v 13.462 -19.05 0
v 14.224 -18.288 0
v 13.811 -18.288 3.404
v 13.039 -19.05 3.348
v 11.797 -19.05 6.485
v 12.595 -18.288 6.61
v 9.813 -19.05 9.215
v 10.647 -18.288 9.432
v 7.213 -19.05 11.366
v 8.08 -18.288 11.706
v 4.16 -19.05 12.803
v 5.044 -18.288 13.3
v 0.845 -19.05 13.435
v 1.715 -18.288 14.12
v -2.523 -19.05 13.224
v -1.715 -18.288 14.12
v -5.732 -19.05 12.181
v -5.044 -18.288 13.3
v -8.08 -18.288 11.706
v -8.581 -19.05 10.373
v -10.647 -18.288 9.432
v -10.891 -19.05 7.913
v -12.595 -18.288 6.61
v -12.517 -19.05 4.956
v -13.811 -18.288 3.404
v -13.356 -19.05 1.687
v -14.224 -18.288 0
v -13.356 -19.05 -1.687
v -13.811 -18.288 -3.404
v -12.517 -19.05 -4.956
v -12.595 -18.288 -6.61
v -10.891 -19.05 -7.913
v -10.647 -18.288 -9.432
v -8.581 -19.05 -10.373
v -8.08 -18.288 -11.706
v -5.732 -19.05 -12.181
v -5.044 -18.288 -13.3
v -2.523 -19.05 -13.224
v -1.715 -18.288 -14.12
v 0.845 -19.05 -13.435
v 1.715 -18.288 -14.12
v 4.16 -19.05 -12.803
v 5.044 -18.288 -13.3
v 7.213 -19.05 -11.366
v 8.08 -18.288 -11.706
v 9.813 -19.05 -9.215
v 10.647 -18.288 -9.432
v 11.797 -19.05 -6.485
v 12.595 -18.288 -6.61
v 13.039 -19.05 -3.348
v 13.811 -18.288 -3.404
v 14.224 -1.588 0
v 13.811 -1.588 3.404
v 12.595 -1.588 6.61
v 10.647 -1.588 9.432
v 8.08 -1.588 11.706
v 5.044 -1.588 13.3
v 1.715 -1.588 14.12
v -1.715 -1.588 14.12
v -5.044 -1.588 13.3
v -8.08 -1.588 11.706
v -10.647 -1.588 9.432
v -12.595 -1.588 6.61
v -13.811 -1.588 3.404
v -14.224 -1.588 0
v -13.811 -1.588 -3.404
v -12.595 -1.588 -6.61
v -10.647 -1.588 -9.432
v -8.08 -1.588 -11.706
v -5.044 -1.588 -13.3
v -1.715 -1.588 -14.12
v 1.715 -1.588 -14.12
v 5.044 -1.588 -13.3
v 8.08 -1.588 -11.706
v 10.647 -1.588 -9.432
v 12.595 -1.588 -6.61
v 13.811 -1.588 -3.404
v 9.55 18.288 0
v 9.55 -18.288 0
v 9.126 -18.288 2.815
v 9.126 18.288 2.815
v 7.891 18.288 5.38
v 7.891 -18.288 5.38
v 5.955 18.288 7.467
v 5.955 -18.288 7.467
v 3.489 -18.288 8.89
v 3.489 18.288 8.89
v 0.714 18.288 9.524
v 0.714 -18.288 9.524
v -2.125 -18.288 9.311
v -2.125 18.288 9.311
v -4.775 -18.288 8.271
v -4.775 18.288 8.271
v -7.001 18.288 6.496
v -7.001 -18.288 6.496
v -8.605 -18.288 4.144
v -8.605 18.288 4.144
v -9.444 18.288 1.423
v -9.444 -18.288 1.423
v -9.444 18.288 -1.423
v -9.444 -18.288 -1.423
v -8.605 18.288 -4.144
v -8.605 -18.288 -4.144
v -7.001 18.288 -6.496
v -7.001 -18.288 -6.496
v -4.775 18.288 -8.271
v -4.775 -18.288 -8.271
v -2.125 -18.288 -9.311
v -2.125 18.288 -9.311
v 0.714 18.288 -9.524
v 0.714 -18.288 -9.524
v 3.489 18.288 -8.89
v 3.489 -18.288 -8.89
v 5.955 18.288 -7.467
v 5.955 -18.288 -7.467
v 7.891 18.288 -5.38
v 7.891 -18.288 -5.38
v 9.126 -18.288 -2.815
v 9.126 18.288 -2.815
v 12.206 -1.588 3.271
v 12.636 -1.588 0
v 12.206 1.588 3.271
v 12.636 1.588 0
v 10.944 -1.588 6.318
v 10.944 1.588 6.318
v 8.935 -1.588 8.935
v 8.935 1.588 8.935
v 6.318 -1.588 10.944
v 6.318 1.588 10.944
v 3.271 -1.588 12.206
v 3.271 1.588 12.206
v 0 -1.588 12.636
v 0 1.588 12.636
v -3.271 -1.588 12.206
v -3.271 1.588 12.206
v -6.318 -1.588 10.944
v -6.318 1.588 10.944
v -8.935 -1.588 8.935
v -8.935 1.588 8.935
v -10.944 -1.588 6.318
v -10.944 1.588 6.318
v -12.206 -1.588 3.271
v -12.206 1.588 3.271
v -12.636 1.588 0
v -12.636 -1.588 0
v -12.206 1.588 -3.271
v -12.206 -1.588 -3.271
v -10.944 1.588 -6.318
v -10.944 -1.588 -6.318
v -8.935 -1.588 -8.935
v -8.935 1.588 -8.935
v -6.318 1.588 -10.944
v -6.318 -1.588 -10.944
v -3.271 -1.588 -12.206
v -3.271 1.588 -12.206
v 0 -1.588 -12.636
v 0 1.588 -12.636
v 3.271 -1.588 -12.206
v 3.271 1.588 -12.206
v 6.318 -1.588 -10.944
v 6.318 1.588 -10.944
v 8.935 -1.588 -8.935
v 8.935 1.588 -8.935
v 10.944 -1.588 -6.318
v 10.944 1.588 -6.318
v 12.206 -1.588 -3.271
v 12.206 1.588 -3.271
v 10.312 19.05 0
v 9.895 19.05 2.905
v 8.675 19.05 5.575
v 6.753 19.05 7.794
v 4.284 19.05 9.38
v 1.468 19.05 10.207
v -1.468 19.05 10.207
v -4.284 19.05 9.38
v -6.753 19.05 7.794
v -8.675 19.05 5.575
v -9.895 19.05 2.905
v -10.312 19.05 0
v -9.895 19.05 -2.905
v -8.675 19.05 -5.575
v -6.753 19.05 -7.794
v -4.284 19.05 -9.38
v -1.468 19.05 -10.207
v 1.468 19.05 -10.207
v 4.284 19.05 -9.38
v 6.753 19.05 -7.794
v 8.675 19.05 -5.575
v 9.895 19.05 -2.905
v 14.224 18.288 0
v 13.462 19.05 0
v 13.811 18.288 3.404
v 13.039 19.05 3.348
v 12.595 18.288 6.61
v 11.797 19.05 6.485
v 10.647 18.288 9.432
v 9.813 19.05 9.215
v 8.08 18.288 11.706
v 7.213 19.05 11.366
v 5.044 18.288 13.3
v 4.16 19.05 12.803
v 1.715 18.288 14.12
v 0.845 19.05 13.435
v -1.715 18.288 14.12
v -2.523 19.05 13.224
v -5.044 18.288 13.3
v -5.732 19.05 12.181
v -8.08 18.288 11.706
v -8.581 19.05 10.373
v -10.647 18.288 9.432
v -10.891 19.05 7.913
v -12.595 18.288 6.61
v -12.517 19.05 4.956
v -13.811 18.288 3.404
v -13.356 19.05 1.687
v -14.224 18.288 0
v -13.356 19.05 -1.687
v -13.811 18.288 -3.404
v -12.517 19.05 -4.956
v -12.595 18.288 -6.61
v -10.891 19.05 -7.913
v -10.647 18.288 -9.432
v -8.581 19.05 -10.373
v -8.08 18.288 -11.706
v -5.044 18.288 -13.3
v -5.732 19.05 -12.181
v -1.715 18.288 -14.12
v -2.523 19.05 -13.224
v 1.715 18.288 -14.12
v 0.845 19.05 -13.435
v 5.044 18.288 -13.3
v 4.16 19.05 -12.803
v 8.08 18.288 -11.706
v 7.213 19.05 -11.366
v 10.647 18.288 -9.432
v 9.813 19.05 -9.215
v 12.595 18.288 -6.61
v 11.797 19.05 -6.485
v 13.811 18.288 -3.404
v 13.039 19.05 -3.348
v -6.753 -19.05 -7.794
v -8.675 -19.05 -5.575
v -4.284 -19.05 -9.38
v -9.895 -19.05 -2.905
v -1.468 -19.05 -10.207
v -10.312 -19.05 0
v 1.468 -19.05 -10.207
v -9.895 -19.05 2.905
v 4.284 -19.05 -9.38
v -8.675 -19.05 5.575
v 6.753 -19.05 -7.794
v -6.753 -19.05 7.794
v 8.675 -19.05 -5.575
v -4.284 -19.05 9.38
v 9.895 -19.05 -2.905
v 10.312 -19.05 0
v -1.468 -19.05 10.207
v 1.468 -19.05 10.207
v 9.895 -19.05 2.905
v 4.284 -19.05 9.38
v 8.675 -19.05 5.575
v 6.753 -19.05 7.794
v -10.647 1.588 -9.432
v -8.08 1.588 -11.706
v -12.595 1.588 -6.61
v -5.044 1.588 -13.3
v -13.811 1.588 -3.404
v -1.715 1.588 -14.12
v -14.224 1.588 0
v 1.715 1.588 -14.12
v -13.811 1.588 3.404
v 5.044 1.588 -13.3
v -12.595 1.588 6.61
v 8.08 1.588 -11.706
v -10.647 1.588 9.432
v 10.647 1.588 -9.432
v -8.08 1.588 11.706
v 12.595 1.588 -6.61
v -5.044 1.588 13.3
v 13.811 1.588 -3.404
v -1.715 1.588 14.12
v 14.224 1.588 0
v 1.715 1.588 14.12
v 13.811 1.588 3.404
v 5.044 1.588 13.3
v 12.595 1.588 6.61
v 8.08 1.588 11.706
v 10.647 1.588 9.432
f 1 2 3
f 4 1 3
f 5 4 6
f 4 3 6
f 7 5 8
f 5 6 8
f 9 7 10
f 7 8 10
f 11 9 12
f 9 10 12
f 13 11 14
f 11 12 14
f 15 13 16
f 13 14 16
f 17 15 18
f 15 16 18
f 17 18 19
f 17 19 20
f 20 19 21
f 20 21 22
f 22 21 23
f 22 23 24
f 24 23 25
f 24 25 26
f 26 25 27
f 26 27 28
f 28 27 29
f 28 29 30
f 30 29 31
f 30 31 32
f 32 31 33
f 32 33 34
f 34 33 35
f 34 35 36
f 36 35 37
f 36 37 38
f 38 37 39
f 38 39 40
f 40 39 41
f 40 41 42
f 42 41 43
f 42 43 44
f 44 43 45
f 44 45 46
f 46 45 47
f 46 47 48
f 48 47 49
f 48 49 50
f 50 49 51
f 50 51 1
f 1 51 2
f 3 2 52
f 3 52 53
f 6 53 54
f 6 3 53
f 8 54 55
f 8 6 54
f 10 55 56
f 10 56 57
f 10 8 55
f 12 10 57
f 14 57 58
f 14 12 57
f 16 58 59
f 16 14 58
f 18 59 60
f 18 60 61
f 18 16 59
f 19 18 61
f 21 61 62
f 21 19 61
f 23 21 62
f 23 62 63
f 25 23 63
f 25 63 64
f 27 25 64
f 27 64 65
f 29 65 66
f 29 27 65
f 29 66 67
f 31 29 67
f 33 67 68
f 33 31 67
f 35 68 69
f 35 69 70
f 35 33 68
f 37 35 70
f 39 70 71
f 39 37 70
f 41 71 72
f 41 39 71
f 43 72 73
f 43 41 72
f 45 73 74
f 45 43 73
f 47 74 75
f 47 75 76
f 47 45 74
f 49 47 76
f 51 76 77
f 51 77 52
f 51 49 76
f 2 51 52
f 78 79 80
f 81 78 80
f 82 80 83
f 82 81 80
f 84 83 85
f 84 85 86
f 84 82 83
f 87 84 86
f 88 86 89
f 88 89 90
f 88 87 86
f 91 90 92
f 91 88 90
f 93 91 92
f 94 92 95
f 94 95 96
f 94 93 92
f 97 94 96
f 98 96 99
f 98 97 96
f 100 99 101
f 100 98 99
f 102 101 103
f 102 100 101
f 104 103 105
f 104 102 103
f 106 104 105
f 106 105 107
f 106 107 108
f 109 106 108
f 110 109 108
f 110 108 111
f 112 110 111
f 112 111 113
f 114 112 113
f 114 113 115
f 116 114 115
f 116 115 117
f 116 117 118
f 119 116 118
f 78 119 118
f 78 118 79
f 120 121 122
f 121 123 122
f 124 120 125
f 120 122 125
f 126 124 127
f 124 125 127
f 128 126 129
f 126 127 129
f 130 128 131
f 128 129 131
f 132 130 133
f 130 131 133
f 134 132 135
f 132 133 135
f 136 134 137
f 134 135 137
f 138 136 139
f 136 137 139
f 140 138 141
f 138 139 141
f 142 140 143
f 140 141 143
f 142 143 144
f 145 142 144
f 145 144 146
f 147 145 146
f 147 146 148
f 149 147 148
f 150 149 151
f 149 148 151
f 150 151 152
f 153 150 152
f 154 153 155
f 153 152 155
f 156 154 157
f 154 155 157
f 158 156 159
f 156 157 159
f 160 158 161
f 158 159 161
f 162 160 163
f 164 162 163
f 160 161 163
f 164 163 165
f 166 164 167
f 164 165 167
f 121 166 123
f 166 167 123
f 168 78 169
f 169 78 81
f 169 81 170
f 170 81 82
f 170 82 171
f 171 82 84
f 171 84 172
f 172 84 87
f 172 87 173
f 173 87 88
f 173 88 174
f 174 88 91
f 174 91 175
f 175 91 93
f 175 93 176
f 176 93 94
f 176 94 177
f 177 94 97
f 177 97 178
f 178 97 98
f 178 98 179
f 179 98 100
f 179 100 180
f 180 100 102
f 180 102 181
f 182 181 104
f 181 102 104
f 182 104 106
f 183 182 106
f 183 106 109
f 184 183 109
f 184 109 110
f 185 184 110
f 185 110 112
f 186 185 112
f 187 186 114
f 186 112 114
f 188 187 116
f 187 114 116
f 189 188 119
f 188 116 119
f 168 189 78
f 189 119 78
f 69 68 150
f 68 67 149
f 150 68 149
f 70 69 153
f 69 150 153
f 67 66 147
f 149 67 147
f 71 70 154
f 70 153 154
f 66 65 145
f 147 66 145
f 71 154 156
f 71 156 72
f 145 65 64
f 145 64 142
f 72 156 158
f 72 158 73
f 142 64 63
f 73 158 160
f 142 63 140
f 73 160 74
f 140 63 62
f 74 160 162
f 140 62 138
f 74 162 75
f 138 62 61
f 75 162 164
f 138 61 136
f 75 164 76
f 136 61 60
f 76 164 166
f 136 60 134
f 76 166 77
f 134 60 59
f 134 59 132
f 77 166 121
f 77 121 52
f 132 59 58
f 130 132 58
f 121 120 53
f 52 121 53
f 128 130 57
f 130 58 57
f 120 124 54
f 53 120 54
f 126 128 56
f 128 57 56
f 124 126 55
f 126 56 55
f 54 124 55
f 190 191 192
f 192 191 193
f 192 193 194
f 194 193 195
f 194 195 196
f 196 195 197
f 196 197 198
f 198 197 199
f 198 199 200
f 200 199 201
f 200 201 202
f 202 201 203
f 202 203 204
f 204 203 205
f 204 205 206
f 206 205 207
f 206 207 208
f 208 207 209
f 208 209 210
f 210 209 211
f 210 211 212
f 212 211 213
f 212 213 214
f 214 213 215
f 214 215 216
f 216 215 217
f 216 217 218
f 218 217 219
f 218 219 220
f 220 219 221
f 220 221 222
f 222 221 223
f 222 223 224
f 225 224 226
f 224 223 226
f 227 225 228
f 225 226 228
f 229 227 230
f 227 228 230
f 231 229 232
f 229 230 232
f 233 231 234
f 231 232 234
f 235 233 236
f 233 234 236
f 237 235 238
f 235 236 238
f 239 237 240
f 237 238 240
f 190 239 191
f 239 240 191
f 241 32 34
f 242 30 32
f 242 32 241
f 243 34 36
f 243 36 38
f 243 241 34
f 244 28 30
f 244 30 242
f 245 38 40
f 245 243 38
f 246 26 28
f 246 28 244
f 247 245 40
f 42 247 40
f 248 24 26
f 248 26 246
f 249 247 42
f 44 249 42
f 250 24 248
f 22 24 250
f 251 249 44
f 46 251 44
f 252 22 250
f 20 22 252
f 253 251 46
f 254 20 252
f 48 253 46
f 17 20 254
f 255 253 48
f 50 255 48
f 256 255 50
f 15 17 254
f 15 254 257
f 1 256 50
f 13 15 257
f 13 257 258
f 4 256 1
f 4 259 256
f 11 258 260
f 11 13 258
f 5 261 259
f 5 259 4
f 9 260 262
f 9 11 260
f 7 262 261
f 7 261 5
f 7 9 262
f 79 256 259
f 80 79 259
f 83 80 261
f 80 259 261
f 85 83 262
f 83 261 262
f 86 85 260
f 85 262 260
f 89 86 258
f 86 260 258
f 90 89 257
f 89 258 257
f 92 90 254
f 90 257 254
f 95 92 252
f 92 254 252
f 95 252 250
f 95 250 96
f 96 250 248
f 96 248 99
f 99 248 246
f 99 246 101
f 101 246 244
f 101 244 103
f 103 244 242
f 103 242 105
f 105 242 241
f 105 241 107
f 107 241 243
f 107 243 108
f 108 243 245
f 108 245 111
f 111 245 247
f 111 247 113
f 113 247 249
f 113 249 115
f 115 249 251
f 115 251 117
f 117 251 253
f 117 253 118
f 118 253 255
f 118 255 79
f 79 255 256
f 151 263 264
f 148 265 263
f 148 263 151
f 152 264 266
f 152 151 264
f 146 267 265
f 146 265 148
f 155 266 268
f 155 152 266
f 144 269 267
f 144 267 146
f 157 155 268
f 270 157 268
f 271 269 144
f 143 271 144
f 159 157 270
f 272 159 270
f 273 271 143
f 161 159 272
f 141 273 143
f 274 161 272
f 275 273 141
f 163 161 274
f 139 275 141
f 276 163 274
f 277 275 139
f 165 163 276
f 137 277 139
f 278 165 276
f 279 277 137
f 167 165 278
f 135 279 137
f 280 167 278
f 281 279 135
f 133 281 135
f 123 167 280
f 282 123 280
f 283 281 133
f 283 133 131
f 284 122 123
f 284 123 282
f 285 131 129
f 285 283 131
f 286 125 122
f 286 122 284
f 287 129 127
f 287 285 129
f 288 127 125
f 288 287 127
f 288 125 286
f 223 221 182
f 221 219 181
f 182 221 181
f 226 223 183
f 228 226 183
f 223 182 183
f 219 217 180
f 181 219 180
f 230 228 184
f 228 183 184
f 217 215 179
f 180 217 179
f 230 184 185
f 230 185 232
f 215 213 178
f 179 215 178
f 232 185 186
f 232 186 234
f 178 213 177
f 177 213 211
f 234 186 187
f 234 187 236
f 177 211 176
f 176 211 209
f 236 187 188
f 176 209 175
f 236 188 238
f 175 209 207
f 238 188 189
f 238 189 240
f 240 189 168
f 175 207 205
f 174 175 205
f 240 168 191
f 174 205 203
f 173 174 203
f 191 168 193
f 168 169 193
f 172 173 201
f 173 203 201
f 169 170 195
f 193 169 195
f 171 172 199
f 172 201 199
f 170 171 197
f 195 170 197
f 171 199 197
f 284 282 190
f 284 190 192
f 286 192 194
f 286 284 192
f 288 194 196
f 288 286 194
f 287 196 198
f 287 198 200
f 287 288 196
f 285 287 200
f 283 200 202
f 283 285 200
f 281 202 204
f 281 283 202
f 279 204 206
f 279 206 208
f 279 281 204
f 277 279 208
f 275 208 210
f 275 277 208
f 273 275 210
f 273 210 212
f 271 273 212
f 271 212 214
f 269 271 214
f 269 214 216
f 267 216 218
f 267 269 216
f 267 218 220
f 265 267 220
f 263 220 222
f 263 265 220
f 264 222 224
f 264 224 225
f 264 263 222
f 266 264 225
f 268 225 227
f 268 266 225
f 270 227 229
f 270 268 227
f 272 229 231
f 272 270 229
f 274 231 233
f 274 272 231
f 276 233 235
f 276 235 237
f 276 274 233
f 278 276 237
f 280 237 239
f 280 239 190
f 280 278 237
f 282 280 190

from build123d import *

# Parameters (mm, degrees)
F0_R     = 14.224
F0_R_2   = 9.5504
F1_DEPTH = 19.05
F2_R     = 14.224
F2_R_2   = 12.6365
F3_DEPTH = 1.5875
F4_SIZE  = 0.762


with BuildPart() as f1:
    # F0 (on Front) → F1 (new body, symmetric)
    with BuildSketch(Plane.XZ):
        Circle(F0_R)
        Circle(F0_R_2, mode=Mode.SUBTRACT)
    extrude(amount=F1_DEPTH, both=True)

    # F2 (on Front) → F3 (cut, symmetric)
    with BuildSketch(Plane.XZ):
        Circle(F2_R)
        Circle(F2_R_2, mode=Mode.SUBTRACT)
    extrude(amount=F3_DEPTH, both=True, mode=Mode.SUBTRACT)

    # F4
    f4_edges = [f1.edges().sort_by_distance(p)[0] for p in [
        (-14.224, 19.05, 0),
        (-14.224, -19.05, 0),
        (-9.5504, 19.05, 0),
        (-9.5504, -19.05, 0),
    ]]
    chamfer(f4_edges, length=F4_SIZE)


solid = f1.part
